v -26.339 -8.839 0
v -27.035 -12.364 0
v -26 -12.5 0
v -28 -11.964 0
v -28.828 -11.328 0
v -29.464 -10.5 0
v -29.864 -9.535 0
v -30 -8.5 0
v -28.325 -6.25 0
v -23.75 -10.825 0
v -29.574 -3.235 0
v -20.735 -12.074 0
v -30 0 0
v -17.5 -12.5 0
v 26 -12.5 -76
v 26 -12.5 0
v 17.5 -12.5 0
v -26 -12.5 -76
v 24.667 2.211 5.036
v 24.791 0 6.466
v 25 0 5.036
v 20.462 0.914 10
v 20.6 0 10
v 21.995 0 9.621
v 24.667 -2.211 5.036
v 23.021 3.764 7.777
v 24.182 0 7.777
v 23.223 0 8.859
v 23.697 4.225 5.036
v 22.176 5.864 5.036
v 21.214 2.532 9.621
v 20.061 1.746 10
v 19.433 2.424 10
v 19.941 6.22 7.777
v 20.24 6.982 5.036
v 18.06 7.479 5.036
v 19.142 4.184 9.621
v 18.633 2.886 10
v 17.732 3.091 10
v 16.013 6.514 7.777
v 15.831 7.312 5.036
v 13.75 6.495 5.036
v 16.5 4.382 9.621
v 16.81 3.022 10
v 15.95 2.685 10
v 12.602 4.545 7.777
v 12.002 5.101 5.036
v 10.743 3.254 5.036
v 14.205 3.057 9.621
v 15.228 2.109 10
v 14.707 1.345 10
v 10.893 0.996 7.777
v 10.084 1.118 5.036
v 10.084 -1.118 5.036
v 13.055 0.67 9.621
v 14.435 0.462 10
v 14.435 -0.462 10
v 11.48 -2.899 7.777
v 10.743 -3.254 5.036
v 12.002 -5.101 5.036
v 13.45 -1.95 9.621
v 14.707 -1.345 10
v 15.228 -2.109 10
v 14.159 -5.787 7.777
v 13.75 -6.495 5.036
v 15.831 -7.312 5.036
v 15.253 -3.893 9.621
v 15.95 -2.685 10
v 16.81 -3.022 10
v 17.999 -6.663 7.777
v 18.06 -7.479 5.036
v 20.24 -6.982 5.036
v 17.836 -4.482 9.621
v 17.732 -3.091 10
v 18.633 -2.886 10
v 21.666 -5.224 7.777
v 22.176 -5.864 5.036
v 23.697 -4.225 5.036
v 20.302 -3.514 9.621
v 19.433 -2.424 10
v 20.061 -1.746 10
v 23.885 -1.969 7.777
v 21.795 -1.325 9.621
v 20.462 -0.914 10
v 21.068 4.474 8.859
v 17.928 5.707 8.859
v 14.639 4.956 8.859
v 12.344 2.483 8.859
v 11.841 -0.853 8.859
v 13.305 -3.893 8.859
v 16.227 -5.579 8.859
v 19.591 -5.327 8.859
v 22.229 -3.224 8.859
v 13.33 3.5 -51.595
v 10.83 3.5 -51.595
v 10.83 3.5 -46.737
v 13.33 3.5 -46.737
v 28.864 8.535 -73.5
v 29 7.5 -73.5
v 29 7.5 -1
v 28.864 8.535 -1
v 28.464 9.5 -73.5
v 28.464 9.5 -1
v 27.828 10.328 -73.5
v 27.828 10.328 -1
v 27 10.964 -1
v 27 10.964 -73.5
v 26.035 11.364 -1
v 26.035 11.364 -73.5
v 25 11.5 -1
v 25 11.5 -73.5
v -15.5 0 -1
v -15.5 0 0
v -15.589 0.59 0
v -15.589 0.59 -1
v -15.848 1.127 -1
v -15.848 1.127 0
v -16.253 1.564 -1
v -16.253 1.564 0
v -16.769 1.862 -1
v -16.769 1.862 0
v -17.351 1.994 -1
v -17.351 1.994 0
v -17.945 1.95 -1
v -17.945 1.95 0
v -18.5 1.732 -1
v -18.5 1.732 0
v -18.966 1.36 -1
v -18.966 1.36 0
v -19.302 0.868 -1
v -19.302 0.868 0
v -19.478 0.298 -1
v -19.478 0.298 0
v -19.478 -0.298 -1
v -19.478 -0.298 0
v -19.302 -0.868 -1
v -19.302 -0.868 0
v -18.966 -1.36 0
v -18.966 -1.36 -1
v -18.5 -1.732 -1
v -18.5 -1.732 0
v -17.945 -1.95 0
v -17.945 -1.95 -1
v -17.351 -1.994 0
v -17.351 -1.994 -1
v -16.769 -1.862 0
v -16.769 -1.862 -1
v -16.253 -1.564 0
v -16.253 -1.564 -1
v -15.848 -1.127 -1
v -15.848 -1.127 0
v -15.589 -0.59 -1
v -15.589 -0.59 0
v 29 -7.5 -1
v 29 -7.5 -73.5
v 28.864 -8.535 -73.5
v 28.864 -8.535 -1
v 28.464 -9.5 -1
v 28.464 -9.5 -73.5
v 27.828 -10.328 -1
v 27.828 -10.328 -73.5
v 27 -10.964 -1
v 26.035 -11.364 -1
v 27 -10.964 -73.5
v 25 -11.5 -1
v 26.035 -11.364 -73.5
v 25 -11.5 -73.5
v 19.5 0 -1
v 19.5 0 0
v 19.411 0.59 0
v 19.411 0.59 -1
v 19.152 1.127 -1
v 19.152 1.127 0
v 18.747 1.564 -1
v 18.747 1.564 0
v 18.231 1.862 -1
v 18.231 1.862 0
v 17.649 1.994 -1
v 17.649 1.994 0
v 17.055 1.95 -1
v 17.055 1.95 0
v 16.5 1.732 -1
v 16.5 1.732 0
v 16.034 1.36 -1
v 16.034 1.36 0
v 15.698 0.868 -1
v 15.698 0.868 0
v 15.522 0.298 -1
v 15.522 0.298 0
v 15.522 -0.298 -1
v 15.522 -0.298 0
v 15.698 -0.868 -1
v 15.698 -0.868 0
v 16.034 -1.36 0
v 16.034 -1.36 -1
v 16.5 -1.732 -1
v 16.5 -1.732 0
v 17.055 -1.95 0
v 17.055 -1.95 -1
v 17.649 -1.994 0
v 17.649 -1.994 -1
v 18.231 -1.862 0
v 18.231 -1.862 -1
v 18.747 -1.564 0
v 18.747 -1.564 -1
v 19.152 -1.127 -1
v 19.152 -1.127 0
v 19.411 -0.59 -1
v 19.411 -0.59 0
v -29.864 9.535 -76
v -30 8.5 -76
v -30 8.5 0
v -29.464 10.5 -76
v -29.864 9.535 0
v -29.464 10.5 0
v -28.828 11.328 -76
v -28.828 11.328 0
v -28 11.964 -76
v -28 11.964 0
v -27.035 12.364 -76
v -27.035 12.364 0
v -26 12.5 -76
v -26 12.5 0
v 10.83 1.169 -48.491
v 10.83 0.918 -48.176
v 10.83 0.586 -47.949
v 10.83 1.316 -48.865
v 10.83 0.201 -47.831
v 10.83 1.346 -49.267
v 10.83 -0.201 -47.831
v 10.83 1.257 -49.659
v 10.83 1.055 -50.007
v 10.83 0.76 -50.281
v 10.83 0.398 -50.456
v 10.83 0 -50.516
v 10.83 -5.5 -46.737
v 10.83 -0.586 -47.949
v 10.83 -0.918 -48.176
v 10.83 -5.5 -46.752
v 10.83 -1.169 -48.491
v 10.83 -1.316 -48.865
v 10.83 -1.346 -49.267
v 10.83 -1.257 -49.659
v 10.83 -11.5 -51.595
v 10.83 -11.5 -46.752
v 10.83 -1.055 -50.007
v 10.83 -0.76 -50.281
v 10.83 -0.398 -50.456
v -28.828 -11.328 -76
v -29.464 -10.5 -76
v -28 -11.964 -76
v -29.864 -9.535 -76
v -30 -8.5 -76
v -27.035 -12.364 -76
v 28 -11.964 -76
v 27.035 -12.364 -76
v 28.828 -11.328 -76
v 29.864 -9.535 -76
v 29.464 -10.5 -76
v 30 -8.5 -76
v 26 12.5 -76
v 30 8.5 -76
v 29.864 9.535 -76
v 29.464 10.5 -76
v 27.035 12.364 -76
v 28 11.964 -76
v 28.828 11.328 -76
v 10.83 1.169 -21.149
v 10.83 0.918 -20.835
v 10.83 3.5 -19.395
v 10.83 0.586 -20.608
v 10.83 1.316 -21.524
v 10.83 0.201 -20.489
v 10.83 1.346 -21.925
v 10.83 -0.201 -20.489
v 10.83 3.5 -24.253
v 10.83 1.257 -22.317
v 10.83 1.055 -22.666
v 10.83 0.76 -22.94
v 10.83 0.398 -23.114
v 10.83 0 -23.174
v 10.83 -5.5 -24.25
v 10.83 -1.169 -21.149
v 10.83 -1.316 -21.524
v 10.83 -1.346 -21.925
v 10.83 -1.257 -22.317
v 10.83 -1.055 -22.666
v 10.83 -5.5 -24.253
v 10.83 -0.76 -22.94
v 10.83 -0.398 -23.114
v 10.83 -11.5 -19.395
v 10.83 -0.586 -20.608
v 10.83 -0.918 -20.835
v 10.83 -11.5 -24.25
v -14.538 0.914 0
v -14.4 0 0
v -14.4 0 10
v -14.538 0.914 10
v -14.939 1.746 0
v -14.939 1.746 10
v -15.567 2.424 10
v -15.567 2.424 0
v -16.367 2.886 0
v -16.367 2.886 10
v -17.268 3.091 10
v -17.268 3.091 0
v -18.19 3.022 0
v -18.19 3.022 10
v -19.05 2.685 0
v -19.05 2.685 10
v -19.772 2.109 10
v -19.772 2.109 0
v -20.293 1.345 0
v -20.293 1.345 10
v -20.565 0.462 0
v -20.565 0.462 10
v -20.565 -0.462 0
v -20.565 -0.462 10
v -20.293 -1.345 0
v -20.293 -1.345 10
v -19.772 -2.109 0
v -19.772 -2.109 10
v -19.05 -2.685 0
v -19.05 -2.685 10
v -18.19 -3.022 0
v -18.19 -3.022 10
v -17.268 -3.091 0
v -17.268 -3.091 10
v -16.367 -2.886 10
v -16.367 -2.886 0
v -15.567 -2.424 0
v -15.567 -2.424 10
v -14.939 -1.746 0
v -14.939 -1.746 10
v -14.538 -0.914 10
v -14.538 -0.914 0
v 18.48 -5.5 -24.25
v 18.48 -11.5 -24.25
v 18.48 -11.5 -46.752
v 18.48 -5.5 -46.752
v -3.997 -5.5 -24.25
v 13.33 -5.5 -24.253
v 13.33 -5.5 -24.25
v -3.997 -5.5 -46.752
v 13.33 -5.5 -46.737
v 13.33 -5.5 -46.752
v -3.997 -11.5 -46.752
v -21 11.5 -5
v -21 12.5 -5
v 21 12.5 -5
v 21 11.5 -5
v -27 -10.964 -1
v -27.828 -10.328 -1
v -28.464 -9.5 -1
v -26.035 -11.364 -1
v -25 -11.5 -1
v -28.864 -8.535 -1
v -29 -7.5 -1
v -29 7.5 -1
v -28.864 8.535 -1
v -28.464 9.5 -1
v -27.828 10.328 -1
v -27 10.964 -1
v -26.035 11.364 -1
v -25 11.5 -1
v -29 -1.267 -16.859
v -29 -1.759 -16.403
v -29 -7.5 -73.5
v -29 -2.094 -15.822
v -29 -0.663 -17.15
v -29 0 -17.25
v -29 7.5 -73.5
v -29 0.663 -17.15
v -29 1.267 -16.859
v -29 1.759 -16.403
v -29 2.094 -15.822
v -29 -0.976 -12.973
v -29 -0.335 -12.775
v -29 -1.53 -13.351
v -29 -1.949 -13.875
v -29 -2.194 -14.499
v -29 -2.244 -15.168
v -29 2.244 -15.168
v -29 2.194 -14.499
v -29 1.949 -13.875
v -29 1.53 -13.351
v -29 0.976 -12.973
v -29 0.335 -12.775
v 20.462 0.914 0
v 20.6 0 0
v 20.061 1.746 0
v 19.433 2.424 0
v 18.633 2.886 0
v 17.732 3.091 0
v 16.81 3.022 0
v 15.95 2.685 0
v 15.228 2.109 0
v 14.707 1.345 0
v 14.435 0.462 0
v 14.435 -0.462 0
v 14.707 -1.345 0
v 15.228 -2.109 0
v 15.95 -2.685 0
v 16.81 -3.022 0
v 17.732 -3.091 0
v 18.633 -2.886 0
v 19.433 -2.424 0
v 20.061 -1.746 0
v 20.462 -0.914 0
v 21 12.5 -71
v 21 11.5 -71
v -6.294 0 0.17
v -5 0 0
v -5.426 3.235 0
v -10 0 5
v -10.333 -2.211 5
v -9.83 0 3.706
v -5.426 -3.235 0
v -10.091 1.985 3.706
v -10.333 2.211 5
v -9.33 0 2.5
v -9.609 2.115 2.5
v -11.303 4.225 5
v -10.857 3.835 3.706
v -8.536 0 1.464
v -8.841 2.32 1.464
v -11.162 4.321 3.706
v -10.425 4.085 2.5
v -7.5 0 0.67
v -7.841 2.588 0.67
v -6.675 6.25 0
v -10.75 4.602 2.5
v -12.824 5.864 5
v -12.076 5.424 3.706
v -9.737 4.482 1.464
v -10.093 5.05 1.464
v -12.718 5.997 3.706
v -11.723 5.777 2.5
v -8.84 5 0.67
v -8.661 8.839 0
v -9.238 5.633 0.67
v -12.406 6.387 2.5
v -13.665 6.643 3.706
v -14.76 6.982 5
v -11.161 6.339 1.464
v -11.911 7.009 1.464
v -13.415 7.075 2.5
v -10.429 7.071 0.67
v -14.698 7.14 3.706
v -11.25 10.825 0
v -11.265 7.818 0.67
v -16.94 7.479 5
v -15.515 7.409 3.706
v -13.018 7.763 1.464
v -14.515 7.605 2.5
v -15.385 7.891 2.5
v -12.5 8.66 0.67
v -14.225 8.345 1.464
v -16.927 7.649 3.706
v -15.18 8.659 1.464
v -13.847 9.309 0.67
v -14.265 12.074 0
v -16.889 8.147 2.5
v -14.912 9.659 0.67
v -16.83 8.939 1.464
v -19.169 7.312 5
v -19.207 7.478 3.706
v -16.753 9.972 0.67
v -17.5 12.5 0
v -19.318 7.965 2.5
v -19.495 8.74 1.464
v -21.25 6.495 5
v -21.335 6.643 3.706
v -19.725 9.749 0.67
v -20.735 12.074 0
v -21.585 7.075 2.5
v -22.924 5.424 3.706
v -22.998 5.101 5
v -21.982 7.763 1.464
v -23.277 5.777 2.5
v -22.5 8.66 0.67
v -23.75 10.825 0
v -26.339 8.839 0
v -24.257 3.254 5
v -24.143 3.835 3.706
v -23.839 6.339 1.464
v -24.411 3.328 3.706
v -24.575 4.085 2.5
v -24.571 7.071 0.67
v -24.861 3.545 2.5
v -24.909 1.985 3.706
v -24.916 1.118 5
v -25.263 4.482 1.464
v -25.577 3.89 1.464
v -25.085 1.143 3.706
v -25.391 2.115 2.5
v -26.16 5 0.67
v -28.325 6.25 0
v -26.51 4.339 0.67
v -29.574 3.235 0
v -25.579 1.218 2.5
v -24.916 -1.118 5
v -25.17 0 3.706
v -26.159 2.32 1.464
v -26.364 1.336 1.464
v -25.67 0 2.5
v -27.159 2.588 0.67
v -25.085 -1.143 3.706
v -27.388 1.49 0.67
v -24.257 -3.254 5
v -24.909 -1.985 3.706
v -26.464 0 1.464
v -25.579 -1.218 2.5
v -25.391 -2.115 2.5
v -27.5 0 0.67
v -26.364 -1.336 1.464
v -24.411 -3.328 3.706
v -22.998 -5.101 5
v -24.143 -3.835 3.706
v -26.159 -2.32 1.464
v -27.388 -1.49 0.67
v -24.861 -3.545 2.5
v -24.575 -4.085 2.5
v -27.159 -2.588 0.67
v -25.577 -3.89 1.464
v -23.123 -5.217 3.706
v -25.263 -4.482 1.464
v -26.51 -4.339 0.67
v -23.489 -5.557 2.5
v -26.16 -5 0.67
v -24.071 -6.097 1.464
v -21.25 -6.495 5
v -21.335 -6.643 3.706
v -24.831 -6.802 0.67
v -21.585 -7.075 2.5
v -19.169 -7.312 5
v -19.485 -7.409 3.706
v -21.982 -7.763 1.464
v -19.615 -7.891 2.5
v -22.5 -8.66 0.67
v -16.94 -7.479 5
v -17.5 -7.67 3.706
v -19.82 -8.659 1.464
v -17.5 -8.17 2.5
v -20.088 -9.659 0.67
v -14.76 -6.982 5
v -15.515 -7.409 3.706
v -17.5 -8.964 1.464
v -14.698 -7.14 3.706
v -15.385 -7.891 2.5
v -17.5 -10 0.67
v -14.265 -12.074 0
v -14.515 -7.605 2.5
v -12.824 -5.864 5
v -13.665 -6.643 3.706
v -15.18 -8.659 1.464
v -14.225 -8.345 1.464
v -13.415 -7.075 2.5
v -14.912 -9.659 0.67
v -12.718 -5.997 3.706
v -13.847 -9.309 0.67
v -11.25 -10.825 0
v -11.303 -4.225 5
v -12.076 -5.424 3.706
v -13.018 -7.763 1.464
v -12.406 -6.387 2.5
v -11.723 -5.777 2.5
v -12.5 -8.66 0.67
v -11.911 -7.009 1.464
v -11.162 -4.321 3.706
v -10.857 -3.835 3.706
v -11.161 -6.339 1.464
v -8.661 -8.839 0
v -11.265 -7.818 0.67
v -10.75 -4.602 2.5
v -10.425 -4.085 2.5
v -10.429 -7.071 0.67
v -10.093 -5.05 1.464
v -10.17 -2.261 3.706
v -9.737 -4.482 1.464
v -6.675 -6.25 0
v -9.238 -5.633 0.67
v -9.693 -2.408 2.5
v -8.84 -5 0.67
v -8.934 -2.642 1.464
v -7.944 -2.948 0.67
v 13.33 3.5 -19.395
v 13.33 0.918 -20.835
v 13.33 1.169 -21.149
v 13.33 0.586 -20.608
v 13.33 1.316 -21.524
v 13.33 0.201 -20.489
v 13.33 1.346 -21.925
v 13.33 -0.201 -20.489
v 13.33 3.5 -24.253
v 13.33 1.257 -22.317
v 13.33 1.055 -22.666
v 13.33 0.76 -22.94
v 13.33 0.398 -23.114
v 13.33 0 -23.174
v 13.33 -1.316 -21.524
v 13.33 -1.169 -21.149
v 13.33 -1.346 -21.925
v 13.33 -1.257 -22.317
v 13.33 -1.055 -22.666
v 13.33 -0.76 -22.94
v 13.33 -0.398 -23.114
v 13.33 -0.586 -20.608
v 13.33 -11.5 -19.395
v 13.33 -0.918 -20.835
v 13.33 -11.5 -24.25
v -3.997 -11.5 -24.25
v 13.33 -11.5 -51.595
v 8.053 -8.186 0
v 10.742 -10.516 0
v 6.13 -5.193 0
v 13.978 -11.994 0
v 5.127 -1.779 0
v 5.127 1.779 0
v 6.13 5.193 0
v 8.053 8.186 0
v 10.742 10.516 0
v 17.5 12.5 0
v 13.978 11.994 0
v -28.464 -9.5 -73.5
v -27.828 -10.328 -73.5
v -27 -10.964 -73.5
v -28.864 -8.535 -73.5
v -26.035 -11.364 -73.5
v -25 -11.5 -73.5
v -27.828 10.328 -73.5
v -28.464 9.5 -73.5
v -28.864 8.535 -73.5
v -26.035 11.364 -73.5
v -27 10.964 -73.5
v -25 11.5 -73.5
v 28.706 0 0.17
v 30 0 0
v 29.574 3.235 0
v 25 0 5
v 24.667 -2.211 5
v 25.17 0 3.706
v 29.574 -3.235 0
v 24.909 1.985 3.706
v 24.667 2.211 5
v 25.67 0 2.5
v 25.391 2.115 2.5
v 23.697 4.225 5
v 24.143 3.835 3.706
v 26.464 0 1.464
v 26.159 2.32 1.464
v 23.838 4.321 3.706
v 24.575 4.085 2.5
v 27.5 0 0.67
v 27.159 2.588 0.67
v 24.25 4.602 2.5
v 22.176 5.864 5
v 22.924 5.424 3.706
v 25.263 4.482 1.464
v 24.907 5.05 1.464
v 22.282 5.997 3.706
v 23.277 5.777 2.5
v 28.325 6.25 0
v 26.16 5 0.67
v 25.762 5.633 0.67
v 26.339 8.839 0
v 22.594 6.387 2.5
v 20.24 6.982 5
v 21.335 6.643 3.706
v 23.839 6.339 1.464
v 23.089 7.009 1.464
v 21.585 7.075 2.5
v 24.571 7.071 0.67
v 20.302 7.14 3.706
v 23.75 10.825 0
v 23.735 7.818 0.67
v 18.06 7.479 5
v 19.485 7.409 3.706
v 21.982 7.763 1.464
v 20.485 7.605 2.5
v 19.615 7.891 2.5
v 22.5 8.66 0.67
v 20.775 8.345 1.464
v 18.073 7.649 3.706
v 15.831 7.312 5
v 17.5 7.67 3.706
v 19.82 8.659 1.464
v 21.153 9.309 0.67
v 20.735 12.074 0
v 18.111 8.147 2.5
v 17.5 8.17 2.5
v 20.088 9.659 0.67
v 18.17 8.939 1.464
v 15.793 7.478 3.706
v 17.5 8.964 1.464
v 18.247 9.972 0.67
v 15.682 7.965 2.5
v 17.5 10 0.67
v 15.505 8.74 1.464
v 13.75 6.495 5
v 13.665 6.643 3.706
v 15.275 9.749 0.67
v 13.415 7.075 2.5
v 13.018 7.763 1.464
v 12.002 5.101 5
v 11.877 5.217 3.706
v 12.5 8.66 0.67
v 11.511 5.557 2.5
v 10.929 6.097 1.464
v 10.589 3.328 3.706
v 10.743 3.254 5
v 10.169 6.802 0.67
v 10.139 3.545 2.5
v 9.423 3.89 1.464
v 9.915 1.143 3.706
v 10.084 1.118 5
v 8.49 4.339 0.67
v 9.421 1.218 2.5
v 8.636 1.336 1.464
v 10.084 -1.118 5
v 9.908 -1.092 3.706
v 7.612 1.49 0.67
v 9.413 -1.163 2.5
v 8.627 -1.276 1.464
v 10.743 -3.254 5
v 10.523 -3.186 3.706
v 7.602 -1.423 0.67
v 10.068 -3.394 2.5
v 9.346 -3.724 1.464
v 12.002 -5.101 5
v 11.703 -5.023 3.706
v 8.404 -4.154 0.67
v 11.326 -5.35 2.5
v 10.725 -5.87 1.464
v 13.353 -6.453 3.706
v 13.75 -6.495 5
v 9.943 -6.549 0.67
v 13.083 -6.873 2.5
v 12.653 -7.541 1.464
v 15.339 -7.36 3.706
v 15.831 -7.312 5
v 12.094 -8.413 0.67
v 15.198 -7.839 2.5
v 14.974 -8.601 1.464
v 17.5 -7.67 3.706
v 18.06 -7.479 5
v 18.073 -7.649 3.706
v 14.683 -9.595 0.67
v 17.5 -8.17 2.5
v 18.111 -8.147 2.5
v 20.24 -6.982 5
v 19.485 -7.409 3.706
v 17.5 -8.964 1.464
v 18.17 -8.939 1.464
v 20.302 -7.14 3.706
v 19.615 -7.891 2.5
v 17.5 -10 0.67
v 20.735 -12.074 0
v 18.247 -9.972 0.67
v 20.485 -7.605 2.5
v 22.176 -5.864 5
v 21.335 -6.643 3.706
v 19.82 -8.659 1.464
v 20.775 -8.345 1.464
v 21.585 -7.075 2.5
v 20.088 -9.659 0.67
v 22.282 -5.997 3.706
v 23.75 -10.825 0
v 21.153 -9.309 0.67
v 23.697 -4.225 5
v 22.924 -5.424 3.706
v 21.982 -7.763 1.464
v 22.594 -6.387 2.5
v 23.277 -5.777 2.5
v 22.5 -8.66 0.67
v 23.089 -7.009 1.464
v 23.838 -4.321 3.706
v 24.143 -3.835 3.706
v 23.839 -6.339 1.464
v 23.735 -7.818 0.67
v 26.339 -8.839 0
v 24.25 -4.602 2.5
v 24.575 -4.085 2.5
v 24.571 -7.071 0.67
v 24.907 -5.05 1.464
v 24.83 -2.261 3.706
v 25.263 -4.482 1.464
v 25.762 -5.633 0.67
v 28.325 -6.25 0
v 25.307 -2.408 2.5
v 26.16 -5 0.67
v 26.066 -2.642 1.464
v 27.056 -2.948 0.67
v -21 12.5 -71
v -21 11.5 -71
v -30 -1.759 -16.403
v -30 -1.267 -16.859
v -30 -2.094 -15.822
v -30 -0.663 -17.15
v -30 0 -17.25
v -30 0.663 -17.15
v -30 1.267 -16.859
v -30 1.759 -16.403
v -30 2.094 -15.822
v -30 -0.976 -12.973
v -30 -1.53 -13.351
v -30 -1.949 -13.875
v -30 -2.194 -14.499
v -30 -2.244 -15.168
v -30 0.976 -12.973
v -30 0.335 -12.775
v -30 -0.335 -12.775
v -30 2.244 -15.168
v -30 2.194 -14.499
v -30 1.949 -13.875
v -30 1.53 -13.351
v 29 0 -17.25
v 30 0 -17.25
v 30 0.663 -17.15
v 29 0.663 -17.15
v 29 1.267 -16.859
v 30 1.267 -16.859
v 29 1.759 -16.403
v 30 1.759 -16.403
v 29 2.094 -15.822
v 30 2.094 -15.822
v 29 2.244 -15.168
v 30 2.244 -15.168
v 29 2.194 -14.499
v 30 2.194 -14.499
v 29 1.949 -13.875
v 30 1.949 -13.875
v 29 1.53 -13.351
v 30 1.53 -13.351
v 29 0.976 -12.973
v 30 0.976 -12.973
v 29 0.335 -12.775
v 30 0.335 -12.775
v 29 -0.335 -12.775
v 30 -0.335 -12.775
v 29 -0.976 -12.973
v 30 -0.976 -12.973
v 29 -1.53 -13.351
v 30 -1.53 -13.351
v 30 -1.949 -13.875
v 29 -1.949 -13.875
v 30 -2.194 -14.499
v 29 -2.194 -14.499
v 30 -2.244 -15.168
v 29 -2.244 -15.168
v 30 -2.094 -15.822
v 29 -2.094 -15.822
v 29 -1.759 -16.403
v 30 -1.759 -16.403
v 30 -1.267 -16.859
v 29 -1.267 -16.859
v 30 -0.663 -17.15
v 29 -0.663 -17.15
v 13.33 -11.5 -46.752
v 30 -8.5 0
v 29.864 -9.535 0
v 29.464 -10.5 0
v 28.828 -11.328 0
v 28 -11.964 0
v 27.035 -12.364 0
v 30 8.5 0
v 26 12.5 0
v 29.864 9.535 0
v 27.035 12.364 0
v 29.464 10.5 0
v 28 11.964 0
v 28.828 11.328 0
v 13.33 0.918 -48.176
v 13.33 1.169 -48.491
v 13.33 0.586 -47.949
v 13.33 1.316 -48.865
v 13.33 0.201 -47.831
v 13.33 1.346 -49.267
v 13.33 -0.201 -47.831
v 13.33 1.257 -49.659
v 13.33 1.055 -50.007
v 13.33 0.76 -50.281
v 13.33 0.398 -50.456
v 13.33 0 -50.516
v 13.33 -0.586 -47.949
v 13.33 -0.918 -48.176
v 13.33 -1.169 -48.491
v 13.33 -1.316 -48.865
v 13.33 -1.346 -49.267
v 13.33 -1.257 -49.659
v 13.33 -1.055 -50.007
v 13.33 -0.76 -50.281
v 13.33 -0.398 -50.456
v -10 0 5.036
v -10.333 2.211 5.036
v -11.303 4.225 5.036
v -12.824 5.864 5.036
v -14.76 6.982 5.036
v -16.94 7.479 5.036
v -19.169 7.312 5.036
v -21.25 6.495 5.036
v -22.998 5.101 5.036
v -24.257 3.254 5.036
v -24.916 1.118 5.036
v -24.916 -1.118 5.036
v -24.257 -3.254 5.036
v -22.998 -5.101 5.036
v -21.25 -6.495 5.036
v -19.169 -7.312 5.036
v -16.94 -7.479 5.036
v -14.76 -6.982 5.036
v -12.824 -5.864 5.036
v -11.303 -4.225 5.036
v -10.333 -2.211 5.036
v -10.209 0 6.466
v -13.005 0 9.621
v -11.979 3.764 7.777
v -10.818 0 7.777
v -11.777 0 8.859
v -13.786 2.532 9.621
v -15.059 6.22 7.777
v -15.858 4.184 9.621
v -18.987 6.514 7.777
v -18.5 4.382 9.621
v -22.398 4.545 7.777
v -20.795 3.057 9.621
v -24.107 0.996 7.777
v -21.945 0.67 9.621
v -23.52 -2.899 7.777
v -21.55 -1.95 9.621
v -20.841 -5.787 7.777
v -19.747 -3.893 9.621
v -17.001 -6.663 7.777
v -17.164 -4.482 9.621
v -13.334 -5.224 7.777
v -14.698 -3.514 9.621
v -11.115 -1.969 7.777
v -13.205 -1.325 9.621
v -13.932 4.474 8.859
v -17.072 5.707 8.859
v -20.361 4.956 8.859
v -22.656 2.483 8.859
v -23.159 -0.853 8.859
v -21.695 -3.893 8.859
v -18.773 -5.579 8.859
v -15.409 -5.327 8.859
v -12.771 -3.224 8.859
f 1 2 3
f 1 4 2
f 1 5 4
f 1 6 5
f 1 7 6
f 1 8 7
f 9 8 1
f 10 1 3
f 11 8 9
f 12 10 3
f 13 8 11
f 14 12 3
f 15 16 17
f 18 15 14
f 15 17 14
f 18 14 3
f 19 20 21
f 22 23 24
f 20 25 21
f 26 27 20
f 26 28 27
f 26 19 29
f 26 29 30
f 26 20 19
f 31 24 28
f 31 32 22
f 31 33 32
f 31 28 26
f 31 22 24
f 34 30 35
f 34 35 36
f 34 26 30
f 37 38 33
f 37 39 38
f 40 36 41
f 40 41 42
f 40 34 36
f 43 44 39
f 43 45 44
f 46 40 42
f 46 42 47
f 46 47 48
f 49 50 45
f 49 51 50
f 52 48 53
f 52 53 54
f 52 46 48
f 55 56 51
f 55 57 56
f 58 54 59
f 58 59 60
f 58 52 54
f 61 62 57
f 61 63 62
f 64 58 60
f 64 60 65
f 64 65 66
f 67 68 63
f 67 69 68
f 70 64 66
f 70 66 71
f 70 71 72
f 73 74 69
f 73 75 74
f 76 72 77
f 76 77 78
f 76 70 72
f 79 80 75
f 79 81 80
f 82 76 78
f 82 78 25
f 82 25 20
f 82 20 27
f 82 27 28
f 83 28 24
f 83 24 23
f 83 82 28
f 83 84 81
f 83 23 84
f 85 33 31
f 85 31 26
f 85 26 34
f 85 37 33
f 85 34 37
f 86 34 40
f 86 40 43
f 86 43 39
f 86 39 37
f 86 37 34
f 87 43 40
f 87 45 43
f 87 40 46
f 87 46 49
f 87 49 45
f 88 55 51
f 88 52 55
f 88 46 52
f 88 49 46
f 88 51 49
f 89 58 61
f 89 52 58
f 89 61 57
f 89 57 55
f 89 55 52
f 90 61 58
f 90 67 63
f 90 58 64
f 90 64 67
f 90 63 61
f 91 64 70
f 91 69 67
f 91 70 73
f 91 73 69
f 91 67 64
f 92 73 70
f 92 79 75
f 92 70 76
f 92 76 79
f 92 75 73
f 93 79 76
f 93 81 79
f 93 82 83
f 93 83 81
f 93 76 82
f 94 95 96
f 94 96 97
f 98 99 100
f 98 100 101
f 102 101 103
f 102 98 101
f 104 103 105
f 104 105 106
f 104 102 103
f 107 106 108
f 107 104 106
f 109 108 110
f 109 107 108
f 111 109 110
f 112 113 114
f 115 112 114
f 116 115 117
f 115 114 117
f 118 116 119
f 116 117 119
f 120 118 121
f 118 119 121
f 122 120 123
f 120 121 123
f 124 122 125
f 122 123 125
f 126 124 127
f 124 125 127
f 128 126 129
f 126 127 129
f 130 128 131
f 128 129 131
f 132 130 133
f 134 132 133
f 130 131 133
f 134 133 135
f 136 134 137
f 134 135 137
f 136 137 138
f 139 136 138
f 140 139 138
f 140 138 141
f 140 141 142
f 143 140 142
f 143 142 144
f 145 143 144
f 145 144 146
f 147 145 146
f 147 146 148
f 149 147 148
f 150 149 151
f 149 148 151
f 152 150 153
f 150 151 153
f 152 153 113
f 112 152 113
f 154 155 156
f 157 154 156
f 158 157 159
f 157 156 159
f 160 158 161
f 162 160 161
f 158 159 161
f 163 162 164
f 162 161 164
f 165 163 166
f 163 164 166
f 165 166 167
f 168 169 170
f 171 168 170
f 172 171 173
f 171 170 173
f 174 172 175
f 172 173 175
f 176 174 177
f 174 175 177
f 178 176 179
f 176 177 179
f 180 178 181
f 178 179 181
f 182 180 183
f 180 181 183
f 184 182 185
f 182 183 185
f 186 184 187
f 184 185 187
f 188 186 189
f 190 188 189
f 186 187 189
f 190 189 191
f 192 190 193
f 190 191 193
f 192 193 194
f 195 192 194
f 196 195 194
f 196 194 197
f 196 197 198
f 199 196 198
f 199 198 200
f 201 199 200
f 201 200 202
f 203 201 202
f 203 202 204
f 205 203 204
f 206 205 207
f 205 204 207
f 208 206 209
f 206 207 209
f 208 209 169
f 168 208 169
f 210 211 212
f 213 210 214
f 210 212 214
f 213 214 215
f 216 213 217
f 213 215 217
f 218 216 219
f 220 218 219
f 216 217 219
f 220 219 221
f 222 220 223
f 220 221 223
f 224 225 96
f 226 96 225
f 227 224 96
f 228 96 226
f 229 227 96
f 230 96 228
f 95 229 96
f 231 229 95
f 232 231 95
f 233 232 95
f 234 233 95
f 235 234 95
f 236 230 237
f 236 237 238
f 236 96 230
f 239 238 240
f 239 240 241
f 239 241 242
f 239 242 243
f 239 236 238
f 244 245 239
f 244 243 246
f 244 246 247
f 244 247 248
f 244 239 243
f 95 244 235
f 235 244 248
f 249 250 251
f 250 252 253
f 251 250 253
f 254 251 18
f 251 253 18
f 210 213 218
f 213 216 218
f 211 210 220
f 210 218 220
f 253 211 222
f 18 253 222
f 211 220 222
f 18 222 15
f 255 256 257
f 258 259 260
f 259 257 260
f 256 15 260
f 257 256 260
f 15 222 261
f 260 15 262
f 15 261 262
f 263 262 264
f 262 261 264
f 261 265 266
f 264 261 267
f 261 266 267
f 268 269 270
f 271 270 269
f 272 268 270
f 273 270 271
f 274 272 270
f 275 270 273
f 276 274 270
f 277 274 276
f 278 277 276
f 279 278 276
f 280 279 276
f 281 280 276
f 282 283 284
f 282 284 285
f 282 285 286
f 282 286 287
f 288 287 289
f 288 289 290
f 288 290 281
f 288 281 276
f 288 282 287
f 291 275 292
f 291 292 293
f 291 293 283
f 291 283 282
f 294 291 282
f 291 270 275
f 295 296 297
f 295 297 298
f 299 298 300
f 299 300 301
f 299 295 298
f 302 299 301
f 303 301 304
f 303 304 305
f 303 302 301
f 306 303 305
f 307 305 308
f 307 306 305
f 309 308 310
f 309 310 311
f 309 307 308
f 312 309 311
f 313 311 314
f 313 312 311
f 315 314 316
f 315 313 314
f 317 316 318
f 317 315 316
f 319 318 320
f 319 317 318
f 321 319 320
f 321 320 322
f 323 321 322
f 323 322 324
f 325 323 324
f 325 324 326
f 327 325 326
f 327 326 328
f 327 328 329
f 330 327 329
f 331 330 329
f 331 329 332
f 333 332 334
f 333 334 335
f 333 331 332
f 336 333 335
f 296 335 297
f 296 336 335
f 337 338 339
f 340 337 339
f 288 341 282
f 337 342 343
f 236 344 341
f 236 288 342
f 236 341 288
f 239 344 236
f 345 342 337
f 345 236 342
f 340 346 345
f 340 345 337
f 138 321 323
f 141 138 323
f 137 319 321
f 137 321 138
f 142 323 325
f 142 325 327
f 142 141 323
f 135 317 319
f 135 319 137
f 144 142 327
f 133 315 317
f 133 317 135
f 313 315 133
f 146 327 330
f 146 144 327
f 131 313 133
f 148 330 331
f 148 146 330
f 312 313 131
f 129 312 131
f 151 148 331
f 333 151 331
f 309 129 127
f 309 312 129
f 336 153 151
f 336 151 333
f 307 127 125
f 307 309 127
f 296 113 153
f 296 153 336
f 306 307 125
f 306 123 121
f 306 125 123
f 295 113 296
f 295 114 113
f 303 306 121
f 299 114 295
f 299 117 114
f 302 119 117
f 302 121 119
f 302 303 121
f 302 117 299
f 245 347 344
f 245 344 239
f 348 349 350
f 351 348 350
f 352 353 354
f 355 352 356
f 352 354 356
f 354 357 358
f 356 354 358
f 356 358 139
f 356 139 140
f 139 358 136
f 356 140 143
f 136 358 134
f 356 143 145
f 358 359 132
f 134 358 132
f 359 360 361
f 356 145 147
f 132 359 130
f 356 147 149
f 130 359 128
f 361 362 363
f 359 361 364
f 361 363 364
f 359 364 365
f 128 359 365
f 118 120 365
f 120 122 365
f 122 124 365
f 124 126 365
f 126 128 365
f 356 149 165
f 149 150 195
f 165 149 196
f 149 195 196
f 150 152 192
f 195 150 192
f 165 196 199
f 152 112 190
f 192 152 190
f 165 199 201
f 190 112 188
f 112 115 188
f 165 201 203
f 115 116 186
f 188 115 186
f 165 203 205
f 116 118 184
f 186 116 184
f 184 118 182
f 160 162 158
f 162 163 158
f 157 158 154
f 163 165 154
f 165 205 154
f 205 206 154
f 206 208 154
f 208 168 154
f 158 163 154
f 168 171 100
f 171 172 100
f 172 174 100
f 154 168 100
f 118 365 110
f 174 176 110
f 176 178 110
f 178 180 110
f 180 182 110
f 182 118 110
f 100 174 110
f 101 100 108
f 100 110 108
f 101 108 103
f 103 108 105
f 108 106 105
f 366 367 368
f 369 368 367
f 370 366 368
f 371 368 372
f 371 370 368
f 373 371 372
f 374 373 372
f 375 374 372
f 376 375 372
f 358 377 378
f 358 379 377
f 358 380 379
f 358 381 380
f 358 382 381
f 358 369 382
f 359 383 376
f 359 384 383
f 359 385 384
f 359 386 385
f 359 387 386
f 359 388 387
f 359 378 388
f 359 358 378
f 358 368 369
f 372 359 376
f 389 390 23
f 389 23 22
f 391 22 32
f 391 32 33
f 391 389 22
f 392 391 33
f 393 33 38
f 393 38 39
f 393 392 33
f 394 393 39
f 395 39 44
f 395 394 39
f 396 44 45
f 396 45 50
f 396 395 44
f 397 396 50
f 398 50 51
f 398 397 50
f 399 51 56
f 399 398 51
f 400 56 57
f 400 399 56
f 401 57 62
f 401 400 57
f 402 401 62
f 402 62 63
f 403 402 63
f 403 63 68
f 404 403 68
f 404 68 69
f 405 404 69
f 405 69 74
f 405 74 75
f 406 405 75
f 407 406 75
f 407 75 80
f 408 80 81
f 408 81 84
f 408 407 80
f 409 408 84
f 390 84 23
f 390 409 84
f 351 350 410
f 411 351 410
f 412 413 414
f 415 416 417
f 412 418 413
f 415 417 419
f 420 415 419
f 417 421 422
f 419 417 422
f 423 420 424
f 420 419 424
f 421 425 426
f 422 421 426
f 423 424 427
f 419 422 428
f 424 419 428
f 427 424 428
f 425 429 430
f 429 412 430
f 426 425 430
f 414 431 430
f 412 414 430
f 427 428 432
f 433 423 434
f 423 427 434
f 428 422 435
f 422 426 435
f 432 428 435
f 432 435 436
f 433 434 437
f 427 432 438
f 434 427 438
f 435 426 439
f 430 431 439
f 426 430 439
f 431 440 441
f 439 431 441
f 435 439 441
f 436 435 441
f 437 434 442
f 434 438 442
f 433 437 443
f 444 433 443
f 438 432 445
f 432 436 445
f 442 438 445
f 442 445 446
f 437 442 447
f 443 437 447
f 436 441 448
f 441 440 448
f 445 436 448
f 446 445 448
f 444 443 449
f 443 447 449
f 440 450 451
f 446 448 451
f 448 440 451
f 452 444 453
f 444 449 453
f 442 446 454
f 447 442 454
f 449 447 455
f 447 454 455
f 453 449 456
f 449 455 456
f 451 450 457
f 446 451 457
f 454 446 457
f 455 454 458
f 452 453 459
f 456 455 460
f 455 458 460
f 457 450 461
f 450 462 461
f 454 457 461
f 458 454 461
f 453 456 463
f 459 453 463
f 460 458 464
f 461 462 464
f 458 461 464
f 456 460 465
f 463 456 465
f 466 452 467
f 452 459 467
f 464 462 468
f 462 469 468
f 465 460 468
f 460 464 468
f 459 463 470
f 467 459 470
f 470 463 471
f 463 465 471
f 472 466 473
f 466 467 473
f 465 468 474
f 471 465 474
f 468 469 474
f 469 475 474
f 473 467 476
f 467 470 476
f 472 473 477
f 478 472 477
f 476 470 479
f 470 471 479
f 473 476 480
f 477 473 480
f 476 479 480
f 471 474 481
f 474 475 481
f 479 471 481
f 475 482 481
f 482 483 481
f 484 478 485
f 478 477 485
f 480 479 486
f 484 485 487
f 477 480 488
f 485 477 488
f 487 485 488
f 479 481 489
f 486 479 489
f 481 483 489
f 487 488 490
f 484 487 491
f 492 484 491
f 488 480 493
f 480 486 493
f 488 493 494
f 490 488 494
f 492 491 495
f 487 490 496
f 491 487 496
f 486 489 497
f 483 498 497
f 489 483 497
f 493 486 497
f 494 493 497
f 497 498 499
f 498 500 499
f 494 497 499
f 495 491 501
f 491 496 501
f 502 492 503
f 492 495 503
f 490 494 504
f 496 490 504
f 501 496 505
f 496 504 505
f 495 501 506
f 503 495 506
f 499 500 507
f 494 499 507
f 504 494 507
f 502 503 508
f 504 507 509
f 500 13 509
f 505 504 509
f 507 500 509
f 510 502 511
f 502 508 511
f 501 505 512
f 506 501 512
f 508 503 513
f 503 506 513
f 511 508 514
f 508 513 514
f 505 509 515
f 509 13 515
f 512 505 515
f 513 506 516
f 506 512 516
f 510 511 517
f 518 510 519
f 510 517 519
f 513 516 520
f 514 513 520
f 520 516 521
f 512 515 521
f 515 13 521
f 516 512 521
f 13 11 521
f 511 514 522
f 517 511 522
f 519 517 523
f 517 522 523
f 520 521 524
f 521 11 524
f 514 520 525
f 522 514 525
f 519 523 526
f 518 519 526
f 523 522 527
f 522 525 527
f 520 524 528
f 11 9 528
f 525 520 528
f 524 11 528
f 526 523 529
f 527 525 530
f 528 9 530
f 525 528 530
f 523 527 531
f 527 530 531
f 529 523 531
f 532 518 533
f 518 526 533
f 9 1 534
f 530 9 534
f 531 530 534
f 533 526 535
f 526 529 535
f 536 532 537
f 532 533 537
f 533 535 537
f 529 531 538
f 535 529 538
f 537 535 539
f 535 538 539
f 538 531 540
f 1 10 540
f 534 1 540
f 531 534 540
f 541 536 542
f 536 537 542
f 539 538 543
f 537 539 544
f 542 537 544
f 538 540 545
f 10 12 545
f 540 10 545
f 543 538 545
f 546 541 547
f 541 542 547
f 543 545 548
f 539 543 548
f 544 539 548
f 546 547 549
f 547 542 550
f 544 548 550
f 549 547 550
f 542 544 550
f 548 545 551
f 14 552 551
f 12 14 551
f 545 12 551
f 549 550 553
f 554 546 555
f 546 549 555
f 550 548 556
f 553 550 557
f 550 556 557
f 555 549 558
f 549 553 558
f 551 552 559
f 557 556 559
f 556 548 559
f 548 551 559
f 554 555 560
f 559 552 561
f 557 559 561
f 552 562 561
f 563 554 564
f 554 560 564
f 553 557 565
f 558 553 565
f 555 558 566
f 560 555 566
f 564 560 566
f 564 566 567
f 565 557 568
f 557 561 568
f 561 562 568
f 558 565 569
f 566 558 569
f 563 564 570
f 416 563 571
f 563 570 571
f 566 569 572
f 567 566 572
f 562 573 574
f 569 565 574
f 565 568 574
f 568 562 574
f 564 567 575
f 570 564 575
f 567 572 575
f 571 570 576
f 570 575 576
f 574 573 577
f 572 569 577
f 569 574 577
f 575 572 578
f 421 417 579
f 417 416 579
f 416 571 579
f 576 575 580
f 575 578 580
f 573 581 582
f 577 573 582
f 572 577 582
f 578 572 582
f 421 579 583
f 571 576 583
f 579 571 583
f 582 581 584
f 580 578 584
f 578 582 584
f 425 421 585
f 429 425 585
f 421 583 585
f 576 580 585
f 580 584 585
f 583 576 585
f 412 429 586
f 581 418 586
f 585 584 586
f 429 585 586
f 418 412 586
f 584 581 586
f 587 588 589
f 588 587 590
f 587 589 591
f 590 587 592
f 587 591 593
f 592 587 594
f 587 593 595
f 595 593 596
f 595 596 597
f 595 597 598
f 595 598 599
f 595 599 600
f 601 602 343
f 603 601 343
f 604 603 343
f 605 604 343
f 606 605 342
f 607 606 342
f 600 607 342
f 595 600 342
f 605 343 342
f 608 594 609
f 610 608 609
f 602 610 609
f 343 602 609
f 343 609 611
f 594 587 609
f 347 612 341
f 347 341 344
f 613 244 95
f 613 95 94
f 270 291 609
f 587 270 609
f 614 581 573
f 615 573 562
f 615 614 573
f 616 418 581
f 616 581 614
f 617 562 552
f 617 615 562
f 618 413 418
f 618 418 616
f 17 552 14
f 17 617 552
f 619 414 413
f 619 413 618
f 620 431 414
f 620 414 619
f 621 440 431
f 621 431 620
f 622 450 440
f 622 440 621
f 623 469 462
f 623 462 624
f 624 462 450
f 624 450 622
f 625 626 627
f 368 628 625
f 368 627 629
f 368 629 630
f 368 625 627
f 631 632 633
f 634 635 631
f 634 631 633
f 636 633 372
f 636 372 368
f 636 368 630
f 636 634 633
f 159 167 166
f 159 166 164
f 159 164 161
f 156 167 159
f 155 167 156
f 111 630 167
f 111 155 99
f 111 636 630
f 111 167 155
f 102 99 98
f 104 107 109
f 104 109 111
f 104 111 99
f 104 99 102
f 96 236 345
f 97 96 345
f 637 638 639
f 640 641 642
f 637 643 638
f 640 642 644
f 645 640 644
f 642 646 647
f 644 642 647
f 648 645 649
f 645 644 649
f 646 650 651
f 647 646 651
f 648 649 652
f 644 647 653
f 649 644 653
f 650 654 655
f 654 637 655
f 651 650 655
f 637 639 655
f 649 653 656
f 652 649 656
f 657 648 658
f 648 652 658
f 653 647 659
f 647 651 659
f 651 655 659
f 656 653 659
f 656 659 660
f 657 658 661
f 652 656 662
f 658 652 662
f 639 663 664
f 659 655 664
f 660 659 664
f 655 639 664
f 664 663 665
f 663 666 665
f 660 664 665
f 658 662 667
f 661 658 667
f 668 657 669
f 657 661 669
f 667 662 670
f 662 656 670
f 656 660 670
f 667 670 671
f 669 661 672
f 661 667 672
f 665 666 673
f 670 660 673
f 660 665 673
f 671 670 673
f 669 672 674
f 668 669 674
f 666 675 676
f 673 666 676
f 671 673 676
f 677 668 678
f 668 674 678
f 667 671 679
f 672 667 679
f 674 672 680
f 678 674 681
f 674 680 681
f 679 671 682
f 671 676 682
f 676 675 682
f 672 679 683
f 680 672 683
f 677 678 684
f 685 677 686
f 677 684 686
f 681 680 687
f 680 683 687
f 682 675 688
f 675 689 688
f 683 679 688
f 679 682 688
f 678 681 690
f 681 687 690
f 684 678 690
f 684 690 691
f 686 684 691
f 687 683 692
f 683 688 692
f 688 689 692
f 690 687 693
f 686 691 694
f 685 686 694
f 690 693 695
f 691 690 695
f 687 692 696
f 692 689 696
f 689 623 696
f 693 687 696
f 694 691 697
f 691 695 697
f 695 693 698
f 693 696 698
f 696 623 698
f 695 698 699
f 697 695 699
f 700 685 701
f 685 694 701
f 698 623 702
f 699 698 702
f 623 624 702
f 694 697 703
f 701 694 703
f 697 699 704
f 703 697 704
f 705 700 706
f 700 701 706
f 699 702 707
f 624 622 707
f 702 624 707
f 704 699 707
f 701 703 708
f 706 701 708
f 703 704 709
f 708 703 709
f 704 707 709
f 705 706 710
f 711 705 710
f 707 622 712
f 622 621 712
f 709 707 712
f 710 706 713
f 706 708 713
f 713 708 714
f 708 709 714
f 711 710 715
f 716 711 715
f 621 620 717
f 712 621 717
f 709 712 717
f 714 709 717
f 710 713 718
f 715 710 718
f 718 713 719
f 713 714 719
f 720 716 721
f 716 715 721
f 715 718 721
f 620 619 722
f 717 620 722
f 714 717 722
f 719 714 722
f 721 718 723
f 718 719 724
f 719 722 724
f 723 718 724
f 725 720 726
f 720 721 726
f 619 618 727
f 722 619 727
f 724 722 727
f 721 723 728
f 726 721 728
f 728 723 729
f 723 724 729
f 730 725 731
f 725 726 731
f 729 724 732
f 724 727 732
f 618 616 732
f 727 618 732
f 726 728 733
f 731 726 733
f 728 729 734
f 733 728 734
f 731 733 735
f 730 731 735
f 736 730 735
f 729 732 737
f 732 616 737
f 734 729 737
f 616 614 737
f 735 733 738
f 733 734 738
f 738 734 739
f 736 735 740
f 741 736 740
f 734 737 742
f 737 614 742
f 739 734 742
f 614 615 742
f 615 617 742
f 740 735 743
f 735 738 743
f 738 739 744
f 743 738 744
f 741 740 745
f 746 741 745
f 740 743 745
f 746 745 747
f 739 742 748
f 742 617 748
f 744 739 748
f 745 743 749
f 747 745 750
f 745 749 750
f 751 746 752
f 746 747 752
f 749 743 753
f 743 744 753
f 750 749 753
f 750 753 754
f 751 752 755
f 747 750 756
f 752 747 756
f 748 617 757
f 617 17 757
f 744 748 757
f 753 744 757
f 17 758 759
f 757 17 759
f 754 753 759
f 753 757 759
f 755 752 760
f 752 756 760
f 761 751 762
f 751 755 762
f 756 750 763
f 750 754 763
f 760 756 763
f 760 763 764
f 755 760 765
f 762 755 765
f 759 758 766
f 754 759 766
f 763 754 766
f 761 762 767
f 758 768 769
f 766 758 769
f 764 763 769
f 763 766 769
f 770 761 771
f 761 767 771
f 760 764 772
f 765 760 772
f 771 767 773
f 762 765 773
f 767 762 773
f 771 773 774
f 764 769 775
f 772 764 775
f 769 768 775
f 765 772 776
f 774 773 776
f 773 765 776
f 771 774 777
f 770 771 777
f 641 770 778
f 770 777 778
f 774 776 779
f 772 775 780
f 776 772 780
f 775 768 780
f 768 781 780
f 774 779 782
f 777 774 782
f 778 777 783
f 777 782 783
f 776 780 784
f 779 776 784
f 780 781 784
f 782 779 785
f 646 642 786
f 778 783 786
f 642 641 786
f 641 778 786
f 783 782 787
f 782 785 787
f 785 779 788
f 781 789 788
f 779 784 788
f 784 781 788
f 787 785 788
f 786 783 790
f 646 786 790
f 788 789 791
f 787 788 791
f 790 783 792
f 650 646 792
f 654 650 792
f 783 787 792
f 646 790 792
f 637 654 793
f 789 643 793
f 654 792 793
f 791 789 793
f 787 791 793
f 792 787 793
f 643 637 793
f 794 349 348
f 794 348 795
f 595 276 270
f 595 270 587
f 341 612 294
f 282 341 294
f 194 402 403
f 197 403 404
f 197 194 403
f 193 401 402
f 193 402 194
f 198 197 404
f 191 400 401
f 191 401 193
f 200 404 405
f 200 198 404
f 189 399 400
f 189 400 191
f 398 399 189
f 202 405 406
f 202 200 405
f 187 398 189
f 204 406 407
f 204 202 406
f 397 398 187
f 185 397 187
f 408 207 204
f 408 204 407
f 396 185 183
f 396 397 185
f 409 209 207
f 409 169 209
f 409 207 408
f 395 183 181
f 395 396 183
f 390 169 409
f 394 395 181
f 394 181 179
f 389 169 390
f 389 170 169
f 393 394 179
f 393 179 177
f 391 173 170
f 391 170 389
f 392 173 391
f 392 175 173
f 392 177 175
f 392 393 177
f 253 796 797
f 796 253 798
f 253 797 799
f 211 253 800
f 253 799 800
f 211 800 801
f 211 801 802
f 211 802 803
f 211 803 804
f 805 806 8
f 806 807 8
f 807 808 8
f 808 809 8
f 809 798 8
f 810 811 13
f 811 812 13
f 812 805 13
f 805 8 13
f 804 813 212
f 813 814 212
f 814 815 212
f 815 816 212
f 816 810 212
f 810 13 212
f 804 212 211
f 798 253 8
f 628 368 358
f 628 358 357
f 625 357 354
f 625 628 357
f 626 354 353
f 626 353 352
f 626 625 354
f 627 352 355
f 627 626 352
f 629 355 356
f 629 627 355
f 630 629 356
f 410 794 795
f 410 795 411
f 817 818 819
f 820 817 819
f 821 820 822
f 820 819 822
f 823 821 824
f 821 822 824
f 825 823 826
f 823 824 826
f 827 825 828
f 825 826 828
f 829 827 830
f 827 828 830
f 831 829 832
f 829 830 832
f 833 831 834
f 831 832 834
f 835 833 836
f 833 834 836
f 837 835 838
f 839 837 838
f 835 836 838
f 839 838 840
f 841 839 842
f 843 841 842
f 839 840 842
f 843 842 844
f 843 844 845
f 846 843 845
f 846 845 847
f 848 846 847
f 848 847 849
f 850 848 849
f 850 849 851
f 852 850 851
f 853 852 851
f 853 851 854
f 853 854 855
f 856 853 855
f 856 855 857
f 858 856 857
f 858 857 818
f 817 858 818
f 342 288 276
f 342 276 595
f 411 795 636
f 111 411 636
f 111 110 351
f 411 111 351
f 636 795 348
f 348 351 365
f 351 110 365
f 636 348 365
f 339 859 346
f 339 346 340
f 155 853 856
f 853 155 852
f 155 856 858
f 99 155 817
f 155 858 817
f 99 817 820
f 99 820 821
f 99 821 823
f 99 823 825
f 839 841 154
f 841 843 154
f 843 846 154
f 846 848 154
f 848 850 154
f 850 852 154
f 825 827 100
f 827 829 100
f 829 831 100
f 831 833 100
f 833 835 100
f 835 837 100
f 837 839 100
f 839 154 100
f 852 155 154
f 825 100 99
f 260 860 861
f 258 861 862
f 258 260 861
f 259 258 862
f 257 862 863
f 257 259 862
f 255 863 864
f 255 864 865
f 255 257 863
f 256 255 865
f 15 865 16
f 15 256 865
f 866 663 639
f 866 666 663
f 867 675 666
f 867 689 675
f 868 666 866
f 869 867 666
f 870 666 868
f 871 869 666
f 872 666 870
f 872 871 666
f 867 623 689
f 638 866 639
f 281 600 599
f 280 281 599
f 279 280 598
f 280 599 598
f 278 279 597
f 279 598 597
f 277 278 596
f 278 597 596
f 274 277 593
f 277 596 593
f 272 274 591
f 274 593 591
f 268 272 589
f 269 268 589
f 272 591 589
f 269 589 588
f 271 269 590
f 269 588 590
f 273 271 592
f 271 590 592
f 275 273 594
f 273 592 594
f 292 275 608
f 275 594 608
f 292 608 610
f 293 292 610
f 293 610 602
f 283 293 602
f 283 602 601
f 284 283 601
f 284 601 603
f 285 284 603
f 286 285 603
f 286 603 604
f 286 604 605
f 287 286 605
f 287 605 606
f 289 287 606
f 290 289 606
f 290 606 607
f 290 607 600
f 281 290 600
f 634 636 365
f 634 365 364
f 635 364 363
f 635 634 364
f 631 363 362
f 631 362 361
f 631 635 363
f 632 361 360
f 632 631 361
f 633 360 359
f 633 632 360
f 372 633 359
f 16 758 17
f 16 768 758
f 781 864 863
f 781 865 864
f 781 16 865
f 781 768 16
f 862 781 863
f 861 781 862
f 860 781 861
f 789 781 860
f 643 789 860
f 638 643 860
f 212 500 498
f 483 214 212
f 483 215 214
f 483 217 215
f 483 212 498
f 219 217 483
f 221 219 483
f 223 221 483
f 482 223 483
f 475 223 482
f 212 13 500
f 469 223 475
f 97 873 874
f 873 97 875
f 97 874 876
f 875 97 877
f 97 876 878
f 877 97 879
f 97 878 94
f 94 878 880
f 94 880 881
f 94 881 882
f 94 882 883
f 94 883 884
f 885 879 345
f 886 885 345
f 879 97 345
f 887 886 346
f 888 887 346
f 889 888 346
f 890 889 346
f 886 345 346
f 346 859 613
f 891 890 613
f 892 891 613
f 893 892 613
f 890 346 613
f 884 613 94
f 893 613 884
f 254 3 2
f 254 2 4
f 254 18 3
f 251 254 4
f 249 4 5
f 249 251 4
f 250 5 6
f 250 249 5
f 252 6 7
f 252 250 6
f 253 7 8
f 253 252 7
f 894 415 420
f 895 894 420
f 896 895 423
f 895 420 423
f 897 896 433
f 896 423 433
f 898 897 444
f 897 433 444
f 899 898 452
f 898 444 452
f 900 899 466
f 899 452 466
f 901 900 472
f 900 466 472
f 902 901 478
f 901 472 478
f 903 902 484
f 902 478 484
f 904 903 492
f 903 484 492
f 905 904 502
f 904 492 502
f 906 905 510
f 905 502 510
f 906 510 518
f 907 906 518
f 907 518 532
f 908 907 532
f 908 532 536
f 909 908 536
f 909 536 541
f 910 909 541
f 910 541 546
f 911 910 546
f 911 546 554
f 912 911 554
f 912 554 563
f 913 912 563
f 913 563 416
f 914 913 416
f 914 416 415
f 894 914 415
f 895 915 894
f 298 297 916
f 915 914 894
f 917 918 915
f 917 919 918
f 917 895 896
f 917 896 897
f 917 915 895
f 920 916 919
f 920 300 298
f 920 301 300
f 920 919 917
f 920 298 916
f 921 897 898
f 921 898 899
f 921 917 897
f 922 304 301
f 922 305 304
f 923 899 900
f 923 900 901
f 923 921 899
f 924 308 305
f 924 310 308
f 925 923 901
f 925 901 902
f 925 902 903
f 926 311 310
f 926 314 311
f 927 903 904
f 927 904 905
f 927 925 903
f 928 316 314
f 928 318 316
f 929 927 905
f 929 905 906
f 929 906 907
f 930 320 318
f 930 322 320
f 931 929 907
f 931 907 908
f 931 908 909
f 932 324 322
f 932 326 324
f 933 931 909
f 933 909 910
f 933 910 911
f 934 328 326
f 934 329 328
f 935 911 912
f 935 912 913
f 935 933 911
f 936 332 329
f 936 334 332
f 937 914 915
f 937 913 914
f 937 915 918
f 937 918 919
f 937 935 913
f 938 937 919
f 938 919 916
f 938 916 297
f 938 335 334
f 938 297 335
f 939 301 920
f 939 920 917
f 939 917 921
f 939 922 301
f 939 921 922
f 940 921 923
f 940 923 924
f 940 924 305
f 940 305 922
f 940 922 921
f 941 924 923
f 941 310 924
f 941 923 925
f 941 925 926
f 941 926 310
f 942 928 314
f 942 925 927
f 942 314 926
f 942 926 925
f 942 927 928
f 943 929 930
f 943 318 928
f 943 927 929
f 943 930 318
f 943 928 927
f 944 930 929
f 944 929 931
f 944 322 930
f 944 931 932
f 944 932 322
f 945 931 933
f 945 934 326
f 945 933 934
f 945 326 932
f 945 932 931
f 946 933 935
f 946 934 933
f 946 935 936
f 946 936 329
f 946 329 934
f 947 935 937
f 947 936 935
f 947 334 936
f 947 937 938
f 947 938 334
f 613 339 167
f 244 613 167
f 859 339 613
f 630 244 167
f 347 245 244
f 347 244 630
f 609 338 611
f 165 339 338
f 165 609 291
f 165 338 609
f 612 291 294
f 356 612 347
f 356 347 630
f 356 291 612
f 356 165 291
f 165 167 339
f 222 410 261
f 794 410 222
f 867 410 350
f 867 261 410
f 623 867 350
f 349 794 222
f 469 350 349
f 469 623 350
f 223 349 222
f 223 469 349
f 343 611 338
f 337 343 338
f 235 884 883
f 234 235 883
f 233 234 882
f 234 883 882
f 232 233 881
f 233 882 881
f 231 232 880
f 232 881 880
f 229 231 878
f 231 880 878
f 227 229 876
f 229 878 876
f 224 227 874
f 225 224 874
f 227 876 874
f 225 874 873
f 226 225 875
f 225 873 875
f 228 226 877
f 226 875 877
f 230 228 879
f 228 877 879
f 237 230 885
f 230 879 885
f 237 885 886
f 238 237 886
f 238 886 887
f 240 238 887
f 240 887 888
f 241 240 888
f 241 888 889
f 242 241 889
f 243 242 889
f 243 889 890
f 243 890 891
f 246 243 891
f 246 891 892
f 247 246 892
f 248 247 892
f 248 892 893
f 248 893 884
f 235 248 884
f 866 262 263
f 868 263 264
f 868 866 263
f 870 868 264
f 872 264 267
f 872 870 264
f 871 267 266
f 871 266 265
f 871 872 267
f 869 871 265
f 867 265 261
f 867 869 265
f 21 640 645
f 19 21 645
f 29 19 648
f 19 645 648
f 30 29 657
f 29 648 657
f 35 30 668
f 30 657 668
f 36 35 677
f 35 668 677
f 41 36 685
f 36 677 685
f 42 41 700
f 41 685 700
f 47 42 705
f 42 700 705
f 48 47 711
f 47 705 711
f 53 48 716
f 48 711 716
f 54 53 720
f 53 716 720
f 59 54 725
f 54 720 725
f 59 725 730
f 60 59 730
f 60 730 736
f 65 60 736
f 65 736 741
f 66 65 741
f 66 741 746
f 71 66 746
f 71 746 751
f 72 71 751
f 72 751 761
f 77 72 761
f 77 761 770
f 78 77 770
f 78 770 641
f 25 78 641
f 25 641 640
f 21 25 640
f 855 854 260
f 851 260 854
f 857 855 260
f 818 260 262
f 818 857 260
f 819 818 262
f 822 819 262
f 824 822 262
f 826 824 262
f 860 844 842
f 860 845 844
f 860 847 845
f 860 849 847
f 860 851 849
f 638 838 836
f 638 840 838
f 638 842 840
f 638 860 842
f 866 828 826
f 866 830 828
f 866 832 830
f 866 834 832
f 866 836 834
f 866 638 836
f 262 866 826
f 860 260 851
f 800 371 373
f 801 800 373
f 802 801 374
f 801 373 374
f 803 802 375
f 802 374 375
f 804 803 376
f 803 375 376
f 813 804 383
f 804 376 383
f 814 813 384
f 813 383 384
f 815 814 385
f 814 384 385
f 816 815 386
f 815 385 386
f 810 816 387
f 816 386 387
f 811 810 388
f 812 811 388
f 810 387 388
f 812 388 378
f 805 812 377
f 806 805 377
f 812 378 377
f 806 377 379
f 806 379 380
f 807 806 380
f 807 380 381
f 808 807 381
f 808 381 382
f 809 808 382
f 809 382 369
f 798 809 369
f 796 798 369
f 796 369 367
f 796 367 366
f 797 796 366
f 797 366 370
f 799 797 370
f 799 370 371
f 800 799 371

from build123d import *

# Parameters (mm, degrees)
SKETCH1_W           = 60
SKETCH1_H           = 25
BOSS_EXTRUDE1_DEPTH = 1
SKETCH2_W           = 60
SKETCH2_H           = 25
SKETCH2_W_2         = 58
SKETCH2_H_2         = 23
BOSS_EXTRUDE2_DEPTH = 75
FILLET2_R           = 4
SKETCH4_R           = 7.5
SKETCH4_R_2         = 3.1
BOSS_EXTRUDE3_DEPTH = 10
FILLET3_R           = 5
SKETCH18_R          = 2
CUT_EXTRUDE6_DEPTH  = 1
SKETCH5_R           = 2.25
CUT_EXTRUDE1_DEPTH  = 98.63324229
SKETCH10_W          = 22.476776695
SKETCH10_H          = 22.501776695
BOSS_EXTRUDE4_DEPTH = 6
SKETCH12_W          = 2.5
SKETCH12_H          = 4.858493649
BOSS_EXTRUDE5_DEPTH = 15
SKETCH13_R          = 1.35
CUT_EXTRUDE3_DEPTH  = 12
SKETCH19_W          = 42
SKETCH19_H          = 66
CUT_EXTRUDE7_DEPTH  = 1
BOSS_EXTRUDE7_DEPTH = 2.5


with BuildPart() as part:
    # Sketch1 → Boss-Extrude1 (new body)
    with BuildSketch(Plane.XY):
        Rectangle(SKETCH1_W, SKETCH1_H)
    extrude(amount=-BOSS_EXTRUDE1_DEPTH)

    # Sketch2 → Boss-Extrude2 (add)
    with BuildSketch(Plane(origin=(0, 0, -1), x_dir=(-1, 0, 0), z_dir=(0, 0, -1))):
        Rectangle(SKETCH2_W, SKETCH2_H)
        Rectangle(SKETCH2_W_2, SKETCH2_H_2, mode=Mode.SUBTRACT)
    extrude(amount=BOSS_EXTRUDE2_DEPTH)

    # Fillet2
    fillet2_edges = [part.edges().sort_by_distance(p)[0] for p in [
        (-29, 11.5, -38.5),
        (29, 11.5, -38.5),
        (29, -11.5, -38.5),
        (-29, -11.5, -38.5),
        (30, -12.5, -38),
        (-30, -12.5, -38),
        (-30, 12.5, -38),
        (30, 12.5, -38),
    ]]
    fillet(fillet2_edges, radius=FILLET2_R)

    # Sketch4 → Boss-Extrude3 (add)
    # profile 1 of 2: a face of its own
    with BuildSketch(Plane.XY):
        with Locations((-17.5, 0)):
            Circle(SKETCH4_R)
        with Locations((-17.5, 0)):
            Circle(SKETCH4_R_2, mode=Mode.SUBTRACT)
    # profile 2 of 2: a face of its own
    with BuildSketch(Plane.XY):
        with Locations((17.5, 0)):
            Circle(SKETCH4_R)
        with Locations((17.5, 0)):
            Circle(SKETCH4_R_2, mode=Mode.SUBTRACT)
    extrude(amount=BOSS_EXTRUDE3_DEPTH)

    # Fillet3
    # the kernel refuses this fillet: 5 mm, written as the material it adds along each edge
    with BuildSketch(Plane(origin=(17.5, 0, 0), x_dir=(1, 0, 0), z_dir=(0, -1, 0))) as fillet3_piece_1:
        with BuildLine():
            CenterArc((7.5 + FILLET3_R, FILLET3_R), FILLET3_R, 180, 90)
            Line((7.5, FILLET3_R), (7.5, 0))
            Line((7.5, 0), (7.5 + FILLET3_R, 0))
        make_face()
    revolve(axis=Axis((17.5, 0, 0), (0, 0, 1)))
    with BuildSketch(Plane(origin=(-17.5, 0, 0), x_dir=(1, 0, 0), z_dir=(0, -1, 0))) as fillet3_piece_2:
        with BuildLine():
            CenterArc((7.5 + FILLET3_R, FILLET3_R), FILLET3_R, 180, 90)
            Line((7.5, FILLET3_R), (7.5, 0))
            Line((7.5, 0), (7.5 + FILLET3_R, 0))
        make_face()
    revolve(axis=Axis((-17.5, 0, 0), (0, 0, 1)))
    # the kernel refuses this fillet: 5 mm, written as the material it takes off along each edge
    with BuildSketch(Plane(origin=(17.5, 0, 10), x_dir=(1, 0, 0), z_dir=(0, -1, 0))) as fillet3_2_piece_1:
        with BuildLine():
            CenterArc((2.5, -4.963869458), FILLET3_R, 0, 83.107897421)
            Line((3.1, 0), (7.5, 0))
            Line((7.5, 0), (7.5, -4.963869458))
        make_face()
    revolve(axis=Axis((17.5, 0, 10), (0, 0, 1)), mode=Mode.SUBTRACT)
    with BuildSketch(Plane(origin=(-17.5, 0, 10), x_dir=(1, 0, 0), z_dir=(0, -1, 0))) as fillet3_2_piece_2:
        with BuildLine():
            CenterArc((2.5, -4.963869458), FILLET3_R, 0, 83.107897421)
            Line((3.1, 0), (7.5, 0))
            Line((7.5, 0), (7.5, -4.963869458))
        make_face()
    revolve(axis=Axis((-17.5, 0, 10), (0, 0, 1)), mode=Mode.SUBTRACT)

    # Sketch18 → Cut-Extrude6 (cut)
    with BuildSketch(Plane.XY):
        with Locations((-17.5, 0)):
            Circle(SKETCH18_R)
        with Locations((17.5, 0)):
            Circle(SKETCH18_R)
    extrude(amount=-CUT_EXTRUDE6_DEPTH, mode=Mode.SUBTRACT)

    # Sketch5 → Cut-Extrude1 (cut, through all)
    with BuildSketch(Plane(origin=(30, 0, 0), x_dir=(0, 0, -1), z_dir=(1, 0, 0))):
        with Locations((15, 0)):
            Circle(SKETCH5_R)
    extrude(amount=-CUT_EXTRUDE1_DEPTH, mode=Mode.SUBTRACT)

    # Sketch10 → Boss-Extrude4 (add)
    with BuildSketch(Plane(origin=(0, -11.5, 0), x_dir=(1, 0, 0), z_dir=(0, 1, 0))):
        with Locations((7.241611652, 35.500888348)):
            Rectangle(SKETCH10_W, SKETCH10_H)
    extrude(amount=BOSS_EXTRUDE4_DEPTH)

    # Sketch12 → Boss-Extrude5 (add)
    with BuildSketch(Plane(origin=(0, -11.5, 0), x_dir=(1, 0, 0), z_dir=(0, 1, 0))):
        with Locations((12.08, 21.824246825)):
            Rectangle(SKETCH12_W, SKETCH12_H)
        with Locations((12.08, 49.165753176)):
            Rectangle(SKETCH12_W, SKETCH12_H)
    extrude(amount=BOSS_EXTRUDE5_DEPTH)

    # Sketch13 → Cut-Extrude3 (cut)
    with BuildSketch(Plane(origin=(13.33, 0, 0), x_dir=(0, 0, -1), z_dir=(1, 0, 0))):
        with Locations((21.82424682, 0)):
            Circle(SKETCH13_R)
        with Locations((49.165753171, 0)):
            Circle(SKETCH13_R)
    extrude(amount=-CUT_EXTRUDE3_DEPTH, mode=Mode.SUBTRACT)

    # Sketch19 → Cut-Extrude7 (cut)
    with BuildSketch(Plane(origin=(0, 12.5, 0), x_dir=(1, 0, 0), z_dir=(0, 1, 0))):
        with Locations((0, 38)):
            Rectangle(SKETCH19_W, SKETCH19_H)
    extrude(amount=-CUT_EXTRUDE7_DEPTH, mode=Mode.SUBTRACT)

    # Sketch20 → Boss-Extrude7 (add)
    with BuildSketch(Plane(origin=(0, 0, -76), x_dir=(-1, 0, 0), z_dir=(0, 0, -1))):
        with BuildLine():
            Line((-25, 11.5), (25, 11.5))
            ThreePointArc((25, 11.5), (27.828427125, 10.328427125), (29, 7.5))
            Line((29, 7.5), (29, -7.5))
            ThreePointArc((29, -7.5), (27.828427125, -10.328427125), (25, -11.5))
            Line((25, -11.5), (-25, -11.5))
            ThreePointArc((-25, -11.5), (-27.828427125, -10.328427125), (-29, -7.5))
            Line((-29, -7.5), (-29, 7.5))
            ThreePointArc((-29, 7.5), (-27.828427125, 10.328427125), (-25, 11.5))
        make_face()
    extrude(amount=-BOSS_EXTRUDE7_DEPTH)


solid = part.part
